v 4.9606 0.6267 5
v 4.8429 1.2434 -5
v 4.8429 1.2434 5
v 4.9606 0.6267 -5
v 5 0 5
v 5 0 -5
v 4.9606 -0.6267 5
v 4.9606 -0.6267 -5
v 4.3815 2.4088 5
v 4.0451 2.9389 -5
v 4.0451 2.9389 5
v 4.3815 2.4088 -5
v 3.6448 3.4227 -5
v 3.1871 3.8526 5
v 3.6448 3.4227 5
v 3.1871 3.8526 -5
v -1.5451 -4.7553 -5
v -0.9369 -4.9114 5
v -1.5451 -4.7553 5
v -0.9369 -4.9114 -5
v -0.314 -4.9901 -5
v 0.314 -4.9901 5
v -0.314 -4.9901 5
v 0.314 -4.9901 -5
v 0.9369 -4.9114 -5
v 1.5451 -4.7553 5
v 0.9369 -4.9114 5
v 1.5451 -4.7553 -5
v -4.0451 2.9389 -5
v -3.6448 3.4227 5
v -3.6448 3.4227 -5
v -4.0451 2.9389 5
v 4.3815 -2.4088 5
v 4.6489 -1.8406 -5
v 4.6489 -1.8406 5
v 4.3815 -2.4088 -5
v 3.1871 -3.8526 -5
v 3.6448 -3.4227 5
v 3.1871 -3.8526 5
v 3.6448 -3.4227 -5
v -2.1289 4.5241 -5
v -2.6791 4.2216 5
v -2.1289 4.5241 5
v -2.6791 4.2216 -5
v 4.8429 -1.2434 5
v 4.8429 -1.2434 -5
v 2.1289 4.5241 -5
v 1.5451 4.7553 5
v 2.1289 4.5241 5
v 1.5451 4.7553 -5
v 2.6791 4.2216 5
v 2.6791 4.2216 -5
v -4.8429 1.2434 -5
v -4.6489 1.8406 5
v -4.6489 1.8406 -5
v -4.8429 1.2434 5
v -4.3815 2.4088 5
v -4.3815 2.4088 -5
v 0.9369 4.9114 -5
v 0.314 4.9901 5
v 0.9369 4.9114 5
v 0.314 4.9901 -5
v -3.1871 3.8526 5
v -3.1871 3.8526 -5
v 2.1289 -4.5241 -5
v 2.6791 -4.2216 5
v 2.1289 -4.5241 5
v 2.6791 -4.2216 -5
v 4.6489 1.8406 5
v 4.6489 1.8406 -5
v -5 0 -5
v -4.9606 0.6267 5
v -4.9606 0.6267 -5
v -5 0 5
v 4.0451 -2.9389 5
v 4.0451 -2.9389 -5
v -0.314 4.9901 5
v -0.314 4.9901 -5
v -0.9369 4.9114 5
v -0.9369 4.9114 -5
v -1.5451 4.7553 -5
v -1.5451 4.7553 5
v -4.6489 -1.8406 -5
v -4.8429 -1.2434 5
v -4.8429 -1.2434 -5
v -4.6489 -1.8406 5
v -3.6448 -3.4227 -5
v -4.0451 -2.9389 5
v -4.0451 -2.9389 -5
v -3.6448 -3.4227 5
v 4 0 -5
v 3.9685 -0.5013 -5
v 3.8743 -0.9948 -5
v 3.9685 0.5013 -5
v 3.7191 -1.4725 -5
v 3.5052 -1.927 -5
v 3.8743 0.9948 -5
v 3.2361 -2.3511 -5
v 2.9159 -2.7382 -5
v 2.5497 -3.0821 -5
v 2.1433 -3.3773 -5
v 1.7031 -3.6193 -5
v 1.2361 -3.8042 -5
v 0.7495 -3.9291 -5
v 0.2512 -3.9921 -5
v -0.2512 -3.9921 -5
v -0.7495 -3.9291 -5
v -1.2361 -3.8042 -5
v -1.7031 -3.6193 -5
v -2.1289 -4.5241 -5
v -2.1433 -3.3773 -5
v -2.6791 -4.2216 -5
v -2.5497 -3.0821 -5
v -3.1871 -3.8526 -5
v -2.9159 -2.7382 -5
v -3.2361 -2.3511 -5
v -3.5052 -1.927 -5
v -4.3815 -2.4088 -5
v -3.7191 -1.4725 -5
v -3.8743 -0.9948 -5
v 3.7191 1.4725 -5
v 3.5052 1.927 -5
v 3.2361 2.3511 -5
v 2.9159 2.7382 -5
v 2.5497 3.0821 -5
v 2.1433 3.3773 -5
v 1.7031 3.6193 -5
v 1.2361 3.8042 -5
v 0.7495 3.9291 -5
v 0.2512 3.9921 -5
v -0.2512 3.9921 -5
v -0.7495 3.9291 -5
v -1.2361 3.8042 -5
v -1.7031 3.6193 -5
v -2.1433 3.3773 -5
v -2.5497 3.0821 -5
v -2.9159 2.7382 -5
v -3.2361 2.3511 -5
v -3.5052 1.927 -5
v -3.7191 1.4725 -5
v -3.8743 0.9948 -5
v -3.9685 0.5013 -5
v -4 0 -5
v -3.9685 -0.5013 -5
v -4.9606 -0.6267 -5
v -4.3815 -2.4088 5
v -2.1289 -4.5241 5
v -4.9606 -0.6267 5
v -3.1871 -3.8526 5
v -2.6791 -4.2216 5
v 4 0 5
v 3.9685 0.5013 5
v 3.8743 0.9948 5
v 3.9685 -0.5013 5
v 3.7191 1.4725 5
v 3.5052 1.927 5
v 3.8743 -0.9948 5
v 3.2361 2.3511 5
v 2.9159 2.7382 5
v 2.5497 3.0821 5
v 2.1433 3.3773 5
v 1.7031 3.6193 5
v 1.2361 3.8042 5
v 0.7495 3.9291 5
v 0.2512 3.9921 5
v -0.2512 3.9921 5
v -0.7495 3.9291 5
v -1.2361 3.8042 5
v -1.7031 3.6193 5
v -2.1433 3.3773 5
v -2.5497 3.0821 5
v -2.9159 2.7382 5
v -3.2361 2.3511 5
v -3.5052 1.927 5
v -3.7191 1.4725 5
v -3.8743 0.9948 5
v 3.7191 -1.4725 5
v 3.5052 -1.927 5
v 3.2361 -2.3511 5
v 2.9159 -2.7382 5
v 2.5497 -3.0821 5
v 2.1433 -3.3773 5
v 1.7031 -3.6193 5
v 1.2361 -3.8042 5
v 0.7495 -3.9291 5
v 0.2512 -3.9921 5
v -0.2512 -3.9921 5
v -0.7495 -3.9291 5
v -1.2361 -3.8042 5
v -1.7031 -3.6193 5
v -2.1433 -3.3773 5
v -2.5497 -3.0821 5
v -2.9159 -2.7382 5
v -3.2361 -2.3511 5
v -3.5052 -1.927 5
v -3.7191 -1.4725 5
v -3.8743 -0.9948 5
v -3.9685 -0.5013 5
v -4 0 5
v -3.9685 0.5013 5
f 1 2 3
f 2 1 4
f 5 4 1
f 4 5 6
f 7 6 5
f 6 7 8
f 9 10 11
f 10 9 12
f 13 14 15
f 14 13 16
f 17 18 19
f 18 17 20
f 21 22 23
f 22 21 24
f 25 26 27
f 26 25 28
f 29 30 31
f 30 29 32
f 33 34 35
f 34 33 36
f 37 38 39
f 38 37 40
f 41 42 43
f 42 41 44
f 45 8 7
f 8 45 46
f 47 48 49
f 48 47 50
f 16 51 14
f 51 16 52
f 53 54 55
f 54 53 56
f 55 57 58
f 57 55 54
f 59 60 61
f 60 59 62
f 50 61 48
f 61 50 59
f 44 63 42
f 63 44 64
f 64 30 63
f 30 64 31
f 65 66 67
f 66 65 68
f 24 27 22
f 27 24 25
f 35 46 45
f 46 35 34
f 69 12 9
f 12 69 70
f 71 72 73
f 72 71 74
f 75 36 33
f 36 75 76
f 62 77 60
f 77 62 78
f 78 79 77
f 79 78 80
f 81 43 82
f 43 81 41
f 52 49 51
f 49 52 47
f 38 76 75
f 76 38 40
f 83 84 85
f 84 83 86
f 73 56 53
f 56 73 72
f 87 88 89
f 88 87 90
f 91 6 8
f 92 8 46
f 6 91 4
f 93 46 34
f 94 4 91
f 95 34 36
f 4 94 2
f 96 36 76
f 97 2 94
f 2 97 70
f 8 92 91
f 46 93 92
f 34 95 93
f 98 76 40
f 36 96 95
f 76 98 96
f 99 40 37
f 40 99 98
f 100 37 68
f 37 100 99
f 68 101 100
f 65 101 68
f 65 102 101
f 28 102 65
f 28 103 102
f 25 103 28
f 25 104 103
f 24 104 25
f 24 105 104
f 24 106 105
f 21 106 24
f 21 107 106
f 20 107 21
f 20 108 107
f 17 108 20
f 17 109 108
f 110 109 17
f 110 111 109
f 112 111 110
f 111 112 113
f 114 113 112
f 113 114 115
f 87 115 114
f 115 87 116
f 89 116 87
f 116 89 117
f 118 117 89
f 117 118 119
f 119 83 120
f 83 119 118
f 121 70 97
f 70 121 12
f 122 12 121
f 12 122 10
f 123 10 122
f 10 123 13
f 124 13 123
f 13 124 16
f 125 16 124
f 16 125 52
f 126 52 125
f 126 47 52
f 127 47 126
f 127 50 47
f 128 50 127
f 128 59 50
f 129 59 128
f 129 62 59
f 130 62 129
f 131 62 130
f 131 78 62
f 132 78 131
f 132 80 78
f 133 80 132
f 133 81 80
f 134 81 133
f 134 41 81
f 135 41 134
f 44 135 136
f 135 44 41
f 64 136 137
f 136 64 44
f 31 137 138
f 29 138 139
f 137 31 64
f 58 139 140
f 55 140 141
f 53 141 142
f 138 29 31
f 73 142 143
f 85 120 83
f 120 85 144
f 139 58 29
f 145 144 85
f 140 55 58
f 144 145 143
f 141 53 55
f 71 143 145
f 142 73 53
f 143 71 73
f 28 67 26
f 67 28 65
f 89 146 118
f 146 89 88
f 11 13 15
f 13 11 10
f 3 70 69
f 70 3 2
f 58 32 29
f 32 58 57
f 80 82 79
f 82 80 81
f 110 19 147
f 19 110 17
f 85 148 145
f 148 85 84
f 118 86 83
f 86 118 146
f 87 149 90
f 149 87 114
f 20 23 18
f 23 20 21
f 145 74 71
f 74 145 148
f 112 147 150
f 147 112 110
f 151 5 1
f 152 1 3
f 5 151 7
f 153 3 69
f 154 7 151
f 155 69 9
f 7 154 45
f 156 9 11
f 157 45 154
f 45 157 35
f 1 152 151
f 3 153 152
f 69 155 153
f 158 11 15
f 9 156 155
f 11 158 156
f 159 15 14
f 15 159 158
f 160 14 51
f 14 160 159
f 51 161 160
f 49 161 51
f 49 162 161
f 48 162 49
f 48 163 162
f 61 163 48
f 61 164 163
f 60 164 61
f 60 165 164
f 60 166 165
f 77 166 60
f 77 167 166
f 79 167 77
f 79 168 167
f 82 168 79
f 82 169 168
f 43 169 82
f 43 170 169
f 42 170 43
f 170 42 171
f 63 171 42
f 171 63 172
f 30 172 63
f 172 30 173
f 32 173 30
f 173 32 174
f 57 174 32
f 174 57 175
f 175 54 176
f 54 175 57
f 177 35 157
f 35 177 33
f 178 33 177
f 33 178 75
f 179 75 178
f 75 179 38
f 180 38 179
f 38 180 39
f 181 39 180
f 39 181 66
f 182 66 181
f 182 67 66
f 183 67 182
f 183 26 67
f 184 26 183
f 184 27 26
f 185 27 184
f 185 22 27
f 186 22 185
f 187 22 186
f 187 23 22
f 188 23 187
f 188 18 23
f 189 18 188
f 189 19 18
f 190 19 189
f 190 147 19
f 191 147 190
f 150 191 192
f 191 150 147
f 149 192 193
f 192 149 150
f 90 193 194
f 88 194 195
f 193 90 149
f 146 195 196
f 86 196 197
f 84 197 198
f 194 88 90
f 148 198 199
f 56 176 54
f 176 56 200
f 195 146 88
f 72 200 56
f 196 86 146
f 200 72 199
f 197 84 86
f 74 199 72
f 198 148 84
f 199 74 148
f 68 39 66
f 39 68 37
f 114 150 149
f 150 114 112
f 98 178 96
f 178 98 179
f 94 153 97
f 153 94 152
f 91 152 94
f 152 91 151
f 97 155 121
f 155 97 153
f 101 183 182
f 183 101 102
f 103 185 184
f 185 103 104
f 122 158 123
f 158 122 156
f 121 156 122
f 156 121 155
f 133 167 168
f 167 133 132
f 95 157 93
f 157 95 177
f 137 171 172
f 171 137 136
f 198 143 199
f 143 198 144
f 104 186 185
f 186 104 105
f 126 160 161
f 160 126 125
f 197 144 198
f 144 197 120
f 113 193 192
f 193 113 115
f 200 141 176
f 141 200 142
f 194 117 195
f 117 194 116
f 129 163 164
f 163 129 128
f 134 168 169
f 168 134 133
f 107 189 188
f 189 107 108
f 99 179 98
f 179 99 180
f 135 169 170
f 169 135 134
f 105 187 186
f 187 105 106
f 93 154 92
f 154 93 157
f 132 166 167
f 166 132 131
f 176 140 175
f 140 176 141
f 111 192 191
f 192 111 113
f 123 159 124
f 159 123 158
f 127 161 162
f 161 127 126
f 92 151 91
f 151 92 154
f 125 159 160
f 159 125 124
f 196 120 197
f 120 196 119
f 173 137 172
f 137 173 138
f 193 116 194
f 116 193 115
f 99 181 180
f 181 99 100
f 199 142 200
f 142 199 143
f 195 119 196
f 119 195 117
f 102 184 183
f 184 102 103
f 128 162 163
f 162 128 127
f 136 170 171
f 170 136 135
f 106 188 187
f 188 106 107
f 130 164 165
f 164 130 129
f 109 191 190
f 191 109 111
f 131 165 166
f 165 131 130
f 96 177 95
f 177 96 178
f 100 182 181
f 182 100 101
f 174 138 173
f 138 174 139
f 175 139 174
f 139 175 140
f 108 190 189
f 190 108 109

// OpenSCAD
$fn = 50;


difference() {
	union() {
		translate(v = [0, 0, -5.0000000000]) {
			cylinder(h = 10, r = 5.0000000000);
		}
	}
	union() {
		translate(v = [0, 0, -100.0000000000]) {
			cylinder(h = 200, r = 4.0000000000);
		}
	}
}
